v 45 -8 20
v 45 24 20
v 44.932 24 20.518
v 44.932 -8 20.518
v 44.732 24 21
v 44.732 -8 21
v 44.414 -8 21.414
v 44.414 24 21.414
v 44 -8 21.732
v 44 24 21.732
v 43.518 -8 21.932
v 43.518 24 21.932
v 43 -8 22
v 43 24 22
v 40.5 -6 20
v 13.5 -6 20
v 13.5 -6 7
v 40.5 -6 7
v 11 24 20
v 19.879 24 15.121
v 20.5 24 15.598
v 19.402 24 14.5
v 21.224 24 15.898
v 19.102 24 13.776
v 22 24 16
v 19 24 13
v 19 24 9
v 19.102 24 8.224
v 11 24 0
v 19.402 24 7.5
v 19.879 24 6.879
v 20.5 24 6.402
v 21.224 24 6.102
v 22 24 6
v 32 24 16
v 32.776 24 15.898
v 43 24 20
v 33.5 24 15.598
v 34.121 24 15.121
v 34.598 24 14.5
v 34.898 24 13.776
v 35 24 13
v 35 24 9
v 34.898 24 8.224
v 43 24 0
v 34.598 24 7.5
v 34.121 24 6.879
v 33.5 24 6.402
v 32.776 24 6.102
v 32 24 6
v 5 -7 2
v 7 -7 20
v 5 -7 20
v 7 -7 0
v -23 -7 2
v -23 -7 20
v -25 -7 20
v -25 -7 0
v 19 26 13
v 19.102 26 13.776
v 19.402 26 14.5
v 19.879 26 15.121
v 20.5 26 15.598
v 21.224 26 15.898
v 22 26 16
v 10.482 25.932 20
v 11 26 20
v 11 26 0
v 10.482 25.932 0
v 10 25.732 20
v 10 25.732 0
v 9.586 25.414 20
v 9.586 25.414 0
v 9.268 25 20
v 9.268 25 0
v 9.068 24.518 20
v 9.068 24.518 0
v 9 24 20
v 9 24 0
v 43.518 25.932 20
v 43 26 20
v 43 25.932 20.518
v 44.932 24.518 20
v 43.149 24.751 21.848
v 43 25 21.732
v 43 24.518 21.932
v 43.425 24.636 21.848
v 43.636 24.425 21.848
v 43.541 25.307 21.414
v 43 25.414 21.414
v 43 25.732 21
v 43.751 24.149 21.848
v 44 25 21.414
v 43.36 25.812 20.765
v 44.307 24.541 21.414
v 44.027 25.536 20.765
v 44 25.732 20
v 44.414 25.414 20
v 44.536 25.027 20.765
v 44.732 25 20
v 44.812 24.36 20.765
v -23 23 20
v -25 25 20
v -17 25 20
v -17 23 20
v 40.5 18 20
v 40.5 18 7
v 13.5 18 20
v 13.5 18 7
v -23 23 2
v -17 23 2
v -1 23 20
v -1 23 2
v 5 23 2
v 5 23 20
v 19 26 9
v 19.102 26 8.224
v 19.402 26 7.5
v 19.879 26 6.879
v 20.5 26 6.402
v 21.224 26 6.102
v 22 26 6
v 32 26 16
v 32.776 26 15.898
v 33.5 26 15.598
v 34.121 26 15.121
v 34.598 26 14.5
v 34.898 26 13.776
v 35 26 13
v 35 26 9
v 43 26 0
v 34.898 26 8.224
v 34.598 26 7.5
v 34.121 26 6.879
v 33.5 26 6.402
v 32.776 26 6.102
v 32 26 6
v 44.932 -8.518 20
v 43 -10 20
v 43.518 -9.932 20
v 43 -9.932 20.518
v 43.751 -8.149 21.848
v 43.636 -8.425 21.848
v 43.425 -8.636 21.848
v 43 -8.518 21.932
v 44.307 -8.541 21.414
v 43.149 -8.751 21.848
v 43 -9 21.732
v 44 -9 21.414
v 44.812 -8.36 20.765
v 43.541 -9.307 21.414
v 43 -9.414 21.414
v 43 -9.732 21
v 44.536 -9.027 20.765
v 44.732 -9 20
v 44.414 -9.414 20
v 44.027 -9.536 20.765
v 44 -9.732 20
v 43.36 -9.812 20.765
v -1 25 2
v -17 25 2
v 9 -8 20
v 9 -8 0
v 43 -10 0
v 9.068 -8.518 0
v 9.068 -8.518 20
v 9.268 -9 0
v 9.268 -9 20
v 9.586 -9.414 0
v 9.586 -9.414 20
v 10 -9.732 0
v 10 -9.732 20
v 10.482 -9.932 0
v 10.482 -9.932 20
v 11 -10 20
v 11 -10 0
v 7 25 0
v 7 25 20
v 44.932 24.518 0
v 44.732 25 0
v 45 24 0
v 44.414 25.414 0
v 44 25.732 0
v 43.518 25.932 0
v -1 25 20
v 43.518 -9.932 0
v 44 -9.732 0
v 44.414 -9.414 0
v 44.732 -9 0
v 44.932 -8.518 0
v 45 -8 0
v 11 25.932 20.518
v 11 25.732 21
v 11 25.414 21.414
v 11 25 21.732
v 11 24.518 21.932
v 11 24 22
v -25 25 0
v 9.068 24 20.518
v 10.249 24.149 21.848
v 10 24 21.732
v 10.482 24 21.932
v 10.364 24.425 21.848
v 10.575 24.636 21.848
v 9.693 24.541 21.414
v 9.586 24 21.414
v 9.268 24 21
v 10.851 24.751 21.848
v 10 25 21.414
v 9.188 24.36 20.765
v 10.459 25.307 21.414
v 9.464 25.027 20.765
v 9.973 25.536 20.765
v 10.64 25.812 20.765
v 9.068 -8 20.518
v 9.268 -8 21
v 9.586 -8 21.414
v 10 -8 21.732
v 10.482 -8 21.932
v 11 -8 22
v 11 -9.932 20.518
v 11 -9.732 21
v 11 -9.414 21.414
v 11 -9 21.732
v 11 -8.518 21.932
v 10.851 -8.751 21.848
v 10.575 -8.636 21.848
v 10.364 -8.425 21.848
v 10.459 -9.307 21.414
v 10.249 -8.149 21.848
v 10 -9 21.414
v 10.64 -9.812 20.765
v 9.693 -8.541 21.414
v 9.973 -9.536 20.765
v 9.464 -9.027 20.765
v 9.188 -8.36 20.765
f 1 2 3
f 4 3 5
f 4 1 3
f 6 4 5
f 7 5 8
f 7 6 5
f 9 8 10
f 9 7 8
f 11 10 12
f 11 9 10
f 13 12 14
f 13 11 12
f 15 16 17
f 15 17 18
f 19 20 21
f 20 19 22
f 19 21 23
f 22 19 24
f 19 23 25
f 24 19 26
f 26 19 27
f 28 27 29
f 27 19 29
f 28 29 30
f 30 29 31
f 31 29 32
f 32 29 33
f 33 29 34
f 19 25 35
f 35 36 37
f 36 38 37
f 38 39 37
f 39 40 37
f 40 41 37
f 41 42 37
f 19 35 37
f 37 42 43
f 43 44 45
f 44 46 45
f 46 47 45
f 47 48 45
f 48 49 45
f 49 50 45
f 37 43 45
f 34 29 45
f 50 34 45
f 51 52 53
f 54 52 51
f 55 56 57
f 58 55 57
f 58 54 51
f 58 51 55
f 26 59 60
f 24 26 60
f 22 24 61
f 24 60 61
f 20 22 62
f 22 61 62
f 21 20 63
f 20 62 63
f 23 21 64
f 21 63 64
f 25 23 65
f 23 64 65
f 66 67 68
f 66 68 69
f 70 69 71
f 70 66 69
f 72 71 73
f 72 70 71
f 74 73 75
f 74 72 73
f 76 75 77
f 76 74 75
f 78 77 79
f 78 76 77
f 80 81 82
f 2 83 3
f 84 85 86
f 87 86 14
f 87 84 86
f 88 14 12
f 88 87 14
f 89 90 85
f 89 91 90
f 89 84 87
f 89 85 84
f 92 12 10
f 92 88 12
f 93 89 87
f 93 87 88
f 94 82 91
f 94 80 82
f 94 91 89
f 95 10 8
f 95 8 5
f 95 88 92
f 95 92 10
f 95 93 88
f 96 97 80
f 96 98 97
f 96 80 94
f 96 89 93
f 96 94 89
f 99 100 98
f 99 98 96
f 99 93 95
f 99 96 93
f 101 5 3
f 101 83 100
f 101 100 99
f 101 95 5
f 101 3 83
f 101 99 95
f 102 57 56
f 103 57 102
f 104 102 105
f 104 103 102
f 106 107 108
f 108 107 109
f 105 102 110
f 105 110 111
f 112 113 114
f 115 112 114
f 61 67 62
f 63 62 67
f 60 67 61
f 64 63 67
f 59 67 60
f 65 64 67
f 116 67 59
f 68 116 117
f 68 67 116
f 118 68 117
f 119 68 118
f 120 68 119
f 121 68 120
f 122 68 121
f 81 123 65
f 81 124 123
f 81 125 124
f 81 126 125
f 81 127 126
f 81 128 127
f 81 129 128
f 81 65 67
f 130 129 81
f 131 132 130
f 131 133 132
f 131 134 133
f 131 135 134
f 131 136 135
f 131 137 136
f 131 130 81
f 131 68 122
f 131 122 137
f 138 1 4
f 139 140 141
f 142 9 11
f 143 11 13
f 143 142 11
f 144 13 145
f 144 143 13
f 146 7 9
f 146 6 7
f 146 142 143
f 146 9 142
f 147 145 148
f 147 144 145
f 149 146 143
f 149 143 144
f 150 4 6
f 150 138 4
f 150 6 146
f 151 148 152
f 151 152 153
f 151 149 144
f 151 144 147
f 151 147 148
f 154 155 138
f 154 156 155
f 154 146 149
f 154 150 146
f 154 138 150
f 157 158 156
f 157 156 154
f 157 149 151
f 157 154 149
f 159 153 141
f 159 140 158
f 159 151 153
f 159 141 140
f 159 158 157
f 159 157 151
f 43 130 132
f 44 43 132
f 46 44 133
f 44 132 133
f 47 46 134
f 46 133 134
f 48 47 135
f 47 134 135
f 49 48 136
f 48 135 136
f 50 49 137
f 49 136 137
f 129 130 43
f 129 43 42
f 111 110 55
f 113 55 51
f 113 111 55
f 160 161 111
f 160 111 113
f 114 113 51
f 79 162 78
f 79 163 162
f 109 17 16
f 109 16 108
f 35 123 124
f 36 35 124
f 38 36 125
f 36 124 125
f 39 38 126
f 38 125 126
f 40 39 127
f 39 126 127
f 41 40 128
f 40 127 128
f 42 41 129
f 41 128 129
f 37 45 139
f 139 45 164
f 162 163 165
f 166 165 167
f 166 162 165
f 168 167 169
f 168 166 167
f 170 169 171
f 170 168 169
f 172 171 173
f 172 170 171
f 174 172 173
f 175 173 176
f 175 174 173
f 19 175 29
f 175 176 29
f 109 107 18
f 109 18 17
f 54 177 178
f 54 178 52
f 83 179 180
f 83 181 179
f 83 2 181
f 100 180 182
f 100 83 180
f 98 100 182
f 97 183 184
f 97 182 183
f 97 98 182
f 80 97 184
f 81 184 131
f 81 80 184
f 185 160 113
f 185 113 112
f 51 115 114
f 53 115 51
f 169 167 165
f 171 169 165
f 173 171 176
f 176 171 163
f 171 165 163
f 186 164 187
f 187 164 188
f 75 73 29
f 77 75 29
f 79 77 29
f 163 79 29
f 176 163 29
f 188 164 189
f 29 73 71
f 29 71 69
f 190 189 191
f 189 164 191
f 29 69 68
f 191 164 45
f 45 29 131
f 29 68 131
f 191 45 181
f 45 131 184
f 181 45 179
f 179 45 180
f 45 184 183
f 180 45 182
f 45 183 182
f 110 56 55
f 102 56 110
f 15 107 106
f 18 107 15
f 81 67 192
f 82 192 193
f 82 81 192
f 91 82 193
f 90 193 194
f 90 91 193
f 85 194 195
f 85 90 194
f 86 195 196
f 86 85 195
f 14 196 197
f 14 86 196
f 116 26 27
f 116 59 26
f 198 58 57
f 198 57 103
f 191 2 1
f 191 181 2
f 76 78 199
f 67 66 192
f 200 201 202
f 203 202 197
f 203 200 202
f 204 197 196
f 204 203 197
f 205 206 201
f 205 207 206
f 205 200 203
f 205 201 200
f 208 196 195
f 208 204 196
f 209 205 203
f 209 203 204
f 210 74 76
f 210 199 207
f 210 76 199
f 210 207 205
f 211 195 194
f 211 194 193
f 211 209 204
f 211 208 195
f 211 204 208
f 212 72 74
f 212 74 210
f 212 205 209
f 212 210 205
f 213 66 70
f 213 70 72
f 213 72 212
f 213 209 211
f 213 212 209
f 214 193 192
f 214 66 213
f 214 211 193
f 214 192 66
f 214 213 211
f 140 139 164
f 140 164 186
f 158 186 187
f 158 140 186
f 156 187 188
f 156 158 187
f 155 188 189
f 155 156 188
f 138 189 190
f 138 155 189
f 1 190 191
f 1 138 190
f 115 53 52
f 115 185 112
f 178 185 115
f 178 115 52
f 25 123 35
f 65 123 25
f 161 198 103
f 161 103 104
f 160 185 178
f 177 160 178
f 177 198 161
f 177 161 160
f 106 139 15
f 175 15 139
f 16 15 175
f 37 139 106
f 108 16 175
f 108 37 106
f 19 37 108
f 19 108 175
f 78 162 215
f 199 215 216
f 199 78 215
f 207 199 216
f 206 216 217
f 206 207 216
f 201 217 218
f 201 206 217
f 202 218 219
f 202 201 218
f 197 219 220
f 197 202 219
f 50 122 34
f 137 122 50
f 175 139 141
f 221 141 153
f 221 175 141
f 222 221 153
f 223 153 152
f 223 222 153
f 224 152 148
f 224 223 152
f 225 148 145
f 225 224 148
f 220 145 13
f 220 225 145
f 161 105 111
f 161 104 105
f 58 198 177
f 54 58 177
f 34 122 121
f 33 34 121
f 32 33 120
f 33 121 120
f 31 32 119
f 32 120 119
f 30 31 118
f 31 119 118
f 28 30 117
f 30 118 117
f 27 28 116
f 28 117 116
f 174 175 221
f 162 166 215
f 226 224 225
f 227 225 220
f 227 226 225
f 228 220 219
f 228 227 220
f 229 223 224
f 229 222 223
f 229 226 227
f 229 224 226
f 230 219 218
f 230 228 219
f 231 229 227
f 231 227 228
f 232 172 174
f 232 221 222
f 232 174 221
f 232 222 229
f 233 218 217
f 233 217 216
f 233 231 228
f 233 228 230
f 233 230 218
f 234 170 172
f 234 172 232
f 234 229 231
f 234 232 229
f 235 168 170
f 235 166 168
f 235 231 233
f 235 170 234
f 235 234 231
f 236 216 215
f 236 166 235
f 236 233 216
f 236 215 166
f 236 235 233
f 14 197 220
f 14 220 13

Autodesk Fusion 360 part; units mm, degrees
sketch "Esquisse1" plane through (0, 0, 0) normal (0, 0, 1) x (1, 0, 0)
  line L0 (-25, 25) -> (7, 25)
  line L1 (7, 25) -> (7, -7)
  line L2 (7, -7) -> (-25, -7)
  line L3 (-25, -7) -> (-25, 25)
  dimension "d1" = 32
  dimension "d2" = 32
extrude "Extrusion1" add sketch "Esquisse1" along normal blind 20 makes body 1
sketch "Esquisse2" plane through (0, 0, 20) normal (0, 0, 1) x (1, 0, 0)
  line L0 (-25, -7) -> (7, -7)
  line L1 (7, -7) -> (7, 25)
  line L2 (7, 25) -> (-25, 25)
  line L3 (-25, 25) -> (-25, -7)
  line L4 (-23, 23) -> (5, 23)
  line L5 (5, 23) -> (5, -7)
  line L6 (5, -7) -> (-23, -7)
  line L7 (-23, -7) -> (-23, 23)
  dimension "d34" = 2
  dimension "d35" = 2
  dimension "d36" = 2
extrude "Extrusion2" cut sketch "Esquisse2" against normal blind 18 contours L0 L4 L5 L6 L7 bodies 1
sketch "Esquisse3" plane through (0, 25, 0) normal (0, 1, 0) x (-1, 0, 0)
  line L0 (-7, 0) -> (25, 0)
  line L1 (25, 0) -> (25, 20)
  line L2 (25, 20) -> (-7, 20)
  line L3 (-7, 20) -> (-7, 0)
  line L4 (17, 2) -> (1, 2)
  line L5 (1, 2) -> (1, 22.0165)
  line L6 (1, 22.0165) -> (17, 22.0165)
  line L7 (17, 22.0165) -> (17, 2)
  dimension "d7" = 8
  dimension "d8" = 8
  dimension "d9" = 2
extrude "Extrusion3" cut sketch "Esquisse3" against normal blind 6 contours L2 L5 L6 L7 | L2 L4 L5 L7 bodies 1
sketch "Esquisse4" plane through (0, 0, 0) normal (0, 0, 1) x (1, 0, 0)
  line L0 (9, 26) -> (45, 26)
  line L1 (45, 26) -> (45, -10)
  line L2 (45, -10) -> (9, -10)
  line L3 (9, -10) -> (9, 26)
  dimension "d13" = 36
  dimension "d14" = 36
extrude "Extrusion4" add sketch "Esquisse4" along normal blind 22 separate body makes body 2
sketch "Esquisse5" plane through (0, 26, 0) normal (0, 1, 0) x (-1, 0, 0)
  line L0 (-45, 0) -> (-9, 0)
  line L1 (-9, 0) -> (-9, 22)
  line L2 (-9, 22) -> (-45, 22)
  line L3 (-45, 22) -> (-45, 0)
  line L4 (-22, 6) -> (-32, 6)
  line L5 (-35, 9) -> (-35, 13)
  line L6 (-32, 16) -> (-22, 16)
  line L7 (-19, 13) -> (-19, 9)
  arc A0 (-22, 6) -> (-19, 9) centre (-22, 9) ccw
  arc A1 (-35, 9) -> (-32, 6) centre (-32, 9) ccw
  arc A2 (-32, 16) -> (-35, 13) centre (-32, 13) ccw
  arc A3 (-19, 13) -> (-22, 16) centre (-22, 13) ccw
  dimension "d17" = 10
  dimension "d18" = 10
  dimension "d19" = 6
  dimension "d20" = 6
  dimension "d21" = 3
extrude "Extrusion5" cut sketch "Esquisse5" against normal blind 4 contours L4 L5 L6 L7 A0 A1 A2 A3 bodies 2
sketch "Esquisse6" plane through (0, -10, 0) normal (0, -1, 0) x (1, 0, 0)
  line L0 (9, 0) -> (45, 0)
  line L1 (45, 0) -> (45, 22)
  line L2 (45, 22) -> (9, 22)
  line L3 (9, 22) -> (9, 0)
sketch "Esquisse7" plane through (0, 0, 0) normal (0, 0, -1) x (-1, 0, 0)
  line L0 (-45, -10) -> (-9, -10)
  line L1 (-9, -10) -> (-9, 26)
  line L2 (-9, 26) -> (-45, 26)
  line L3 (-45, 26) -> (-45, -10)
  line L4 (-11, 24) -> (-43, 24)
  line L5 (-43, 24) -> (-43, 18)
  line L6 (-43, 18) -> (-11, 18)
  line L7 (-11, 18) -> (-11, 24)
  dimension "d38" = 2
  dimension "d39" = 2
extrude "Extrusion6" cut sketch "Esquisse7" against normal blind 20 contours L4 L5 L6 L7 bodies 2
sketch "Esquisse8" plane through (0, 0, 0) normal (0, 0, -1) x (-1, 0, 0)
  line L0 (-43, 24) -> (-11, 24)
  line L1 (-11, 24) -> (-11, 18)
  line L2 (-11, 18) -> (-43, 18)
  line L3 (-43, 18) -> (-43, 24)
  line L4 (-45, -10) -> (-9, -10)
  line L5 (-9, -10) -> (-9, 26)
  line L6 (-9, 26) -> (-45, 26)
  line L7 (-45, 26) -> (-45, -10)
  line L8 (-11, 18) -> (-43, 18)
  line L9 (-43, 18) -> (-43, -10)
  line L10 (-43, -10) -> (-11, -10)
  line L11 (-11, -10) -> (-11, 18)
  dimension "d37" = 2
extrude "Extrusion7" cut sketch "Esquisse8" against normal blind 7 contours L2 L4 L8 L9 L10 L11 bodies 2
fillet "Congé1" radius 2 4 edges at (9, 26, 11) (45, 26, 11) (45, -10, 11) (9, -10, 11) 1 faces at (21, 2, 22) on bodies 2
sketch "Esquisse9" plane through (0, 0, 7) normal (0, 0, -1) x (-1, 0, 0)
  line L0 (-11, -10) -> (-11, 18)
  line L1 (-11, 18) -> (-43, 18)
  line L2 (-43, 18) -> (-43, -10)
  line L3 (-43, -10) -> (-11, -10)
  line L4 (-11, -10) -> (-13.5, -10)
  line L5 (-13.5, -10) -> (-13.5, 18)
  line L6 (-13.5, 18) -> (-11, 18)
  line L7 (-11, 18) -> (-11, -10)
  line L8 (-43, 18) -> (-40.5, 18)
  line L9 (-40.5, 18) -> (-40.5, -10)
  line L10 (-40.5, -10) -> (-43, -10)
  line L11 (-43, -10) -> (-43, 18)
  dimension "d30" = 2.5
  dimension "d31" = 2.5
extrude "Extrusion8" cut sketch "Esquisse9" against normal blind 13 contours L0 L1 L3 L4 L5 L6 L7 | L1 L2 L3 L8 L9 L10 L11 bodies 2
sketch "Esquisse10" plane through (27, -10, 11) normal (0, -1, 0) x (1, 0, 0)
  line L0 (15.454, -4) -> (-15, -4)
  line L1 (-15, -4) -> (-15, 9)
  line L2 (-15, 9) -> (15.454, 9)
  line L3 (15.454, 9) -> (15.454, -4)
extrude "Extrusion9" cut sketch "Esquisse10" against normal blind 4 bodies 2
